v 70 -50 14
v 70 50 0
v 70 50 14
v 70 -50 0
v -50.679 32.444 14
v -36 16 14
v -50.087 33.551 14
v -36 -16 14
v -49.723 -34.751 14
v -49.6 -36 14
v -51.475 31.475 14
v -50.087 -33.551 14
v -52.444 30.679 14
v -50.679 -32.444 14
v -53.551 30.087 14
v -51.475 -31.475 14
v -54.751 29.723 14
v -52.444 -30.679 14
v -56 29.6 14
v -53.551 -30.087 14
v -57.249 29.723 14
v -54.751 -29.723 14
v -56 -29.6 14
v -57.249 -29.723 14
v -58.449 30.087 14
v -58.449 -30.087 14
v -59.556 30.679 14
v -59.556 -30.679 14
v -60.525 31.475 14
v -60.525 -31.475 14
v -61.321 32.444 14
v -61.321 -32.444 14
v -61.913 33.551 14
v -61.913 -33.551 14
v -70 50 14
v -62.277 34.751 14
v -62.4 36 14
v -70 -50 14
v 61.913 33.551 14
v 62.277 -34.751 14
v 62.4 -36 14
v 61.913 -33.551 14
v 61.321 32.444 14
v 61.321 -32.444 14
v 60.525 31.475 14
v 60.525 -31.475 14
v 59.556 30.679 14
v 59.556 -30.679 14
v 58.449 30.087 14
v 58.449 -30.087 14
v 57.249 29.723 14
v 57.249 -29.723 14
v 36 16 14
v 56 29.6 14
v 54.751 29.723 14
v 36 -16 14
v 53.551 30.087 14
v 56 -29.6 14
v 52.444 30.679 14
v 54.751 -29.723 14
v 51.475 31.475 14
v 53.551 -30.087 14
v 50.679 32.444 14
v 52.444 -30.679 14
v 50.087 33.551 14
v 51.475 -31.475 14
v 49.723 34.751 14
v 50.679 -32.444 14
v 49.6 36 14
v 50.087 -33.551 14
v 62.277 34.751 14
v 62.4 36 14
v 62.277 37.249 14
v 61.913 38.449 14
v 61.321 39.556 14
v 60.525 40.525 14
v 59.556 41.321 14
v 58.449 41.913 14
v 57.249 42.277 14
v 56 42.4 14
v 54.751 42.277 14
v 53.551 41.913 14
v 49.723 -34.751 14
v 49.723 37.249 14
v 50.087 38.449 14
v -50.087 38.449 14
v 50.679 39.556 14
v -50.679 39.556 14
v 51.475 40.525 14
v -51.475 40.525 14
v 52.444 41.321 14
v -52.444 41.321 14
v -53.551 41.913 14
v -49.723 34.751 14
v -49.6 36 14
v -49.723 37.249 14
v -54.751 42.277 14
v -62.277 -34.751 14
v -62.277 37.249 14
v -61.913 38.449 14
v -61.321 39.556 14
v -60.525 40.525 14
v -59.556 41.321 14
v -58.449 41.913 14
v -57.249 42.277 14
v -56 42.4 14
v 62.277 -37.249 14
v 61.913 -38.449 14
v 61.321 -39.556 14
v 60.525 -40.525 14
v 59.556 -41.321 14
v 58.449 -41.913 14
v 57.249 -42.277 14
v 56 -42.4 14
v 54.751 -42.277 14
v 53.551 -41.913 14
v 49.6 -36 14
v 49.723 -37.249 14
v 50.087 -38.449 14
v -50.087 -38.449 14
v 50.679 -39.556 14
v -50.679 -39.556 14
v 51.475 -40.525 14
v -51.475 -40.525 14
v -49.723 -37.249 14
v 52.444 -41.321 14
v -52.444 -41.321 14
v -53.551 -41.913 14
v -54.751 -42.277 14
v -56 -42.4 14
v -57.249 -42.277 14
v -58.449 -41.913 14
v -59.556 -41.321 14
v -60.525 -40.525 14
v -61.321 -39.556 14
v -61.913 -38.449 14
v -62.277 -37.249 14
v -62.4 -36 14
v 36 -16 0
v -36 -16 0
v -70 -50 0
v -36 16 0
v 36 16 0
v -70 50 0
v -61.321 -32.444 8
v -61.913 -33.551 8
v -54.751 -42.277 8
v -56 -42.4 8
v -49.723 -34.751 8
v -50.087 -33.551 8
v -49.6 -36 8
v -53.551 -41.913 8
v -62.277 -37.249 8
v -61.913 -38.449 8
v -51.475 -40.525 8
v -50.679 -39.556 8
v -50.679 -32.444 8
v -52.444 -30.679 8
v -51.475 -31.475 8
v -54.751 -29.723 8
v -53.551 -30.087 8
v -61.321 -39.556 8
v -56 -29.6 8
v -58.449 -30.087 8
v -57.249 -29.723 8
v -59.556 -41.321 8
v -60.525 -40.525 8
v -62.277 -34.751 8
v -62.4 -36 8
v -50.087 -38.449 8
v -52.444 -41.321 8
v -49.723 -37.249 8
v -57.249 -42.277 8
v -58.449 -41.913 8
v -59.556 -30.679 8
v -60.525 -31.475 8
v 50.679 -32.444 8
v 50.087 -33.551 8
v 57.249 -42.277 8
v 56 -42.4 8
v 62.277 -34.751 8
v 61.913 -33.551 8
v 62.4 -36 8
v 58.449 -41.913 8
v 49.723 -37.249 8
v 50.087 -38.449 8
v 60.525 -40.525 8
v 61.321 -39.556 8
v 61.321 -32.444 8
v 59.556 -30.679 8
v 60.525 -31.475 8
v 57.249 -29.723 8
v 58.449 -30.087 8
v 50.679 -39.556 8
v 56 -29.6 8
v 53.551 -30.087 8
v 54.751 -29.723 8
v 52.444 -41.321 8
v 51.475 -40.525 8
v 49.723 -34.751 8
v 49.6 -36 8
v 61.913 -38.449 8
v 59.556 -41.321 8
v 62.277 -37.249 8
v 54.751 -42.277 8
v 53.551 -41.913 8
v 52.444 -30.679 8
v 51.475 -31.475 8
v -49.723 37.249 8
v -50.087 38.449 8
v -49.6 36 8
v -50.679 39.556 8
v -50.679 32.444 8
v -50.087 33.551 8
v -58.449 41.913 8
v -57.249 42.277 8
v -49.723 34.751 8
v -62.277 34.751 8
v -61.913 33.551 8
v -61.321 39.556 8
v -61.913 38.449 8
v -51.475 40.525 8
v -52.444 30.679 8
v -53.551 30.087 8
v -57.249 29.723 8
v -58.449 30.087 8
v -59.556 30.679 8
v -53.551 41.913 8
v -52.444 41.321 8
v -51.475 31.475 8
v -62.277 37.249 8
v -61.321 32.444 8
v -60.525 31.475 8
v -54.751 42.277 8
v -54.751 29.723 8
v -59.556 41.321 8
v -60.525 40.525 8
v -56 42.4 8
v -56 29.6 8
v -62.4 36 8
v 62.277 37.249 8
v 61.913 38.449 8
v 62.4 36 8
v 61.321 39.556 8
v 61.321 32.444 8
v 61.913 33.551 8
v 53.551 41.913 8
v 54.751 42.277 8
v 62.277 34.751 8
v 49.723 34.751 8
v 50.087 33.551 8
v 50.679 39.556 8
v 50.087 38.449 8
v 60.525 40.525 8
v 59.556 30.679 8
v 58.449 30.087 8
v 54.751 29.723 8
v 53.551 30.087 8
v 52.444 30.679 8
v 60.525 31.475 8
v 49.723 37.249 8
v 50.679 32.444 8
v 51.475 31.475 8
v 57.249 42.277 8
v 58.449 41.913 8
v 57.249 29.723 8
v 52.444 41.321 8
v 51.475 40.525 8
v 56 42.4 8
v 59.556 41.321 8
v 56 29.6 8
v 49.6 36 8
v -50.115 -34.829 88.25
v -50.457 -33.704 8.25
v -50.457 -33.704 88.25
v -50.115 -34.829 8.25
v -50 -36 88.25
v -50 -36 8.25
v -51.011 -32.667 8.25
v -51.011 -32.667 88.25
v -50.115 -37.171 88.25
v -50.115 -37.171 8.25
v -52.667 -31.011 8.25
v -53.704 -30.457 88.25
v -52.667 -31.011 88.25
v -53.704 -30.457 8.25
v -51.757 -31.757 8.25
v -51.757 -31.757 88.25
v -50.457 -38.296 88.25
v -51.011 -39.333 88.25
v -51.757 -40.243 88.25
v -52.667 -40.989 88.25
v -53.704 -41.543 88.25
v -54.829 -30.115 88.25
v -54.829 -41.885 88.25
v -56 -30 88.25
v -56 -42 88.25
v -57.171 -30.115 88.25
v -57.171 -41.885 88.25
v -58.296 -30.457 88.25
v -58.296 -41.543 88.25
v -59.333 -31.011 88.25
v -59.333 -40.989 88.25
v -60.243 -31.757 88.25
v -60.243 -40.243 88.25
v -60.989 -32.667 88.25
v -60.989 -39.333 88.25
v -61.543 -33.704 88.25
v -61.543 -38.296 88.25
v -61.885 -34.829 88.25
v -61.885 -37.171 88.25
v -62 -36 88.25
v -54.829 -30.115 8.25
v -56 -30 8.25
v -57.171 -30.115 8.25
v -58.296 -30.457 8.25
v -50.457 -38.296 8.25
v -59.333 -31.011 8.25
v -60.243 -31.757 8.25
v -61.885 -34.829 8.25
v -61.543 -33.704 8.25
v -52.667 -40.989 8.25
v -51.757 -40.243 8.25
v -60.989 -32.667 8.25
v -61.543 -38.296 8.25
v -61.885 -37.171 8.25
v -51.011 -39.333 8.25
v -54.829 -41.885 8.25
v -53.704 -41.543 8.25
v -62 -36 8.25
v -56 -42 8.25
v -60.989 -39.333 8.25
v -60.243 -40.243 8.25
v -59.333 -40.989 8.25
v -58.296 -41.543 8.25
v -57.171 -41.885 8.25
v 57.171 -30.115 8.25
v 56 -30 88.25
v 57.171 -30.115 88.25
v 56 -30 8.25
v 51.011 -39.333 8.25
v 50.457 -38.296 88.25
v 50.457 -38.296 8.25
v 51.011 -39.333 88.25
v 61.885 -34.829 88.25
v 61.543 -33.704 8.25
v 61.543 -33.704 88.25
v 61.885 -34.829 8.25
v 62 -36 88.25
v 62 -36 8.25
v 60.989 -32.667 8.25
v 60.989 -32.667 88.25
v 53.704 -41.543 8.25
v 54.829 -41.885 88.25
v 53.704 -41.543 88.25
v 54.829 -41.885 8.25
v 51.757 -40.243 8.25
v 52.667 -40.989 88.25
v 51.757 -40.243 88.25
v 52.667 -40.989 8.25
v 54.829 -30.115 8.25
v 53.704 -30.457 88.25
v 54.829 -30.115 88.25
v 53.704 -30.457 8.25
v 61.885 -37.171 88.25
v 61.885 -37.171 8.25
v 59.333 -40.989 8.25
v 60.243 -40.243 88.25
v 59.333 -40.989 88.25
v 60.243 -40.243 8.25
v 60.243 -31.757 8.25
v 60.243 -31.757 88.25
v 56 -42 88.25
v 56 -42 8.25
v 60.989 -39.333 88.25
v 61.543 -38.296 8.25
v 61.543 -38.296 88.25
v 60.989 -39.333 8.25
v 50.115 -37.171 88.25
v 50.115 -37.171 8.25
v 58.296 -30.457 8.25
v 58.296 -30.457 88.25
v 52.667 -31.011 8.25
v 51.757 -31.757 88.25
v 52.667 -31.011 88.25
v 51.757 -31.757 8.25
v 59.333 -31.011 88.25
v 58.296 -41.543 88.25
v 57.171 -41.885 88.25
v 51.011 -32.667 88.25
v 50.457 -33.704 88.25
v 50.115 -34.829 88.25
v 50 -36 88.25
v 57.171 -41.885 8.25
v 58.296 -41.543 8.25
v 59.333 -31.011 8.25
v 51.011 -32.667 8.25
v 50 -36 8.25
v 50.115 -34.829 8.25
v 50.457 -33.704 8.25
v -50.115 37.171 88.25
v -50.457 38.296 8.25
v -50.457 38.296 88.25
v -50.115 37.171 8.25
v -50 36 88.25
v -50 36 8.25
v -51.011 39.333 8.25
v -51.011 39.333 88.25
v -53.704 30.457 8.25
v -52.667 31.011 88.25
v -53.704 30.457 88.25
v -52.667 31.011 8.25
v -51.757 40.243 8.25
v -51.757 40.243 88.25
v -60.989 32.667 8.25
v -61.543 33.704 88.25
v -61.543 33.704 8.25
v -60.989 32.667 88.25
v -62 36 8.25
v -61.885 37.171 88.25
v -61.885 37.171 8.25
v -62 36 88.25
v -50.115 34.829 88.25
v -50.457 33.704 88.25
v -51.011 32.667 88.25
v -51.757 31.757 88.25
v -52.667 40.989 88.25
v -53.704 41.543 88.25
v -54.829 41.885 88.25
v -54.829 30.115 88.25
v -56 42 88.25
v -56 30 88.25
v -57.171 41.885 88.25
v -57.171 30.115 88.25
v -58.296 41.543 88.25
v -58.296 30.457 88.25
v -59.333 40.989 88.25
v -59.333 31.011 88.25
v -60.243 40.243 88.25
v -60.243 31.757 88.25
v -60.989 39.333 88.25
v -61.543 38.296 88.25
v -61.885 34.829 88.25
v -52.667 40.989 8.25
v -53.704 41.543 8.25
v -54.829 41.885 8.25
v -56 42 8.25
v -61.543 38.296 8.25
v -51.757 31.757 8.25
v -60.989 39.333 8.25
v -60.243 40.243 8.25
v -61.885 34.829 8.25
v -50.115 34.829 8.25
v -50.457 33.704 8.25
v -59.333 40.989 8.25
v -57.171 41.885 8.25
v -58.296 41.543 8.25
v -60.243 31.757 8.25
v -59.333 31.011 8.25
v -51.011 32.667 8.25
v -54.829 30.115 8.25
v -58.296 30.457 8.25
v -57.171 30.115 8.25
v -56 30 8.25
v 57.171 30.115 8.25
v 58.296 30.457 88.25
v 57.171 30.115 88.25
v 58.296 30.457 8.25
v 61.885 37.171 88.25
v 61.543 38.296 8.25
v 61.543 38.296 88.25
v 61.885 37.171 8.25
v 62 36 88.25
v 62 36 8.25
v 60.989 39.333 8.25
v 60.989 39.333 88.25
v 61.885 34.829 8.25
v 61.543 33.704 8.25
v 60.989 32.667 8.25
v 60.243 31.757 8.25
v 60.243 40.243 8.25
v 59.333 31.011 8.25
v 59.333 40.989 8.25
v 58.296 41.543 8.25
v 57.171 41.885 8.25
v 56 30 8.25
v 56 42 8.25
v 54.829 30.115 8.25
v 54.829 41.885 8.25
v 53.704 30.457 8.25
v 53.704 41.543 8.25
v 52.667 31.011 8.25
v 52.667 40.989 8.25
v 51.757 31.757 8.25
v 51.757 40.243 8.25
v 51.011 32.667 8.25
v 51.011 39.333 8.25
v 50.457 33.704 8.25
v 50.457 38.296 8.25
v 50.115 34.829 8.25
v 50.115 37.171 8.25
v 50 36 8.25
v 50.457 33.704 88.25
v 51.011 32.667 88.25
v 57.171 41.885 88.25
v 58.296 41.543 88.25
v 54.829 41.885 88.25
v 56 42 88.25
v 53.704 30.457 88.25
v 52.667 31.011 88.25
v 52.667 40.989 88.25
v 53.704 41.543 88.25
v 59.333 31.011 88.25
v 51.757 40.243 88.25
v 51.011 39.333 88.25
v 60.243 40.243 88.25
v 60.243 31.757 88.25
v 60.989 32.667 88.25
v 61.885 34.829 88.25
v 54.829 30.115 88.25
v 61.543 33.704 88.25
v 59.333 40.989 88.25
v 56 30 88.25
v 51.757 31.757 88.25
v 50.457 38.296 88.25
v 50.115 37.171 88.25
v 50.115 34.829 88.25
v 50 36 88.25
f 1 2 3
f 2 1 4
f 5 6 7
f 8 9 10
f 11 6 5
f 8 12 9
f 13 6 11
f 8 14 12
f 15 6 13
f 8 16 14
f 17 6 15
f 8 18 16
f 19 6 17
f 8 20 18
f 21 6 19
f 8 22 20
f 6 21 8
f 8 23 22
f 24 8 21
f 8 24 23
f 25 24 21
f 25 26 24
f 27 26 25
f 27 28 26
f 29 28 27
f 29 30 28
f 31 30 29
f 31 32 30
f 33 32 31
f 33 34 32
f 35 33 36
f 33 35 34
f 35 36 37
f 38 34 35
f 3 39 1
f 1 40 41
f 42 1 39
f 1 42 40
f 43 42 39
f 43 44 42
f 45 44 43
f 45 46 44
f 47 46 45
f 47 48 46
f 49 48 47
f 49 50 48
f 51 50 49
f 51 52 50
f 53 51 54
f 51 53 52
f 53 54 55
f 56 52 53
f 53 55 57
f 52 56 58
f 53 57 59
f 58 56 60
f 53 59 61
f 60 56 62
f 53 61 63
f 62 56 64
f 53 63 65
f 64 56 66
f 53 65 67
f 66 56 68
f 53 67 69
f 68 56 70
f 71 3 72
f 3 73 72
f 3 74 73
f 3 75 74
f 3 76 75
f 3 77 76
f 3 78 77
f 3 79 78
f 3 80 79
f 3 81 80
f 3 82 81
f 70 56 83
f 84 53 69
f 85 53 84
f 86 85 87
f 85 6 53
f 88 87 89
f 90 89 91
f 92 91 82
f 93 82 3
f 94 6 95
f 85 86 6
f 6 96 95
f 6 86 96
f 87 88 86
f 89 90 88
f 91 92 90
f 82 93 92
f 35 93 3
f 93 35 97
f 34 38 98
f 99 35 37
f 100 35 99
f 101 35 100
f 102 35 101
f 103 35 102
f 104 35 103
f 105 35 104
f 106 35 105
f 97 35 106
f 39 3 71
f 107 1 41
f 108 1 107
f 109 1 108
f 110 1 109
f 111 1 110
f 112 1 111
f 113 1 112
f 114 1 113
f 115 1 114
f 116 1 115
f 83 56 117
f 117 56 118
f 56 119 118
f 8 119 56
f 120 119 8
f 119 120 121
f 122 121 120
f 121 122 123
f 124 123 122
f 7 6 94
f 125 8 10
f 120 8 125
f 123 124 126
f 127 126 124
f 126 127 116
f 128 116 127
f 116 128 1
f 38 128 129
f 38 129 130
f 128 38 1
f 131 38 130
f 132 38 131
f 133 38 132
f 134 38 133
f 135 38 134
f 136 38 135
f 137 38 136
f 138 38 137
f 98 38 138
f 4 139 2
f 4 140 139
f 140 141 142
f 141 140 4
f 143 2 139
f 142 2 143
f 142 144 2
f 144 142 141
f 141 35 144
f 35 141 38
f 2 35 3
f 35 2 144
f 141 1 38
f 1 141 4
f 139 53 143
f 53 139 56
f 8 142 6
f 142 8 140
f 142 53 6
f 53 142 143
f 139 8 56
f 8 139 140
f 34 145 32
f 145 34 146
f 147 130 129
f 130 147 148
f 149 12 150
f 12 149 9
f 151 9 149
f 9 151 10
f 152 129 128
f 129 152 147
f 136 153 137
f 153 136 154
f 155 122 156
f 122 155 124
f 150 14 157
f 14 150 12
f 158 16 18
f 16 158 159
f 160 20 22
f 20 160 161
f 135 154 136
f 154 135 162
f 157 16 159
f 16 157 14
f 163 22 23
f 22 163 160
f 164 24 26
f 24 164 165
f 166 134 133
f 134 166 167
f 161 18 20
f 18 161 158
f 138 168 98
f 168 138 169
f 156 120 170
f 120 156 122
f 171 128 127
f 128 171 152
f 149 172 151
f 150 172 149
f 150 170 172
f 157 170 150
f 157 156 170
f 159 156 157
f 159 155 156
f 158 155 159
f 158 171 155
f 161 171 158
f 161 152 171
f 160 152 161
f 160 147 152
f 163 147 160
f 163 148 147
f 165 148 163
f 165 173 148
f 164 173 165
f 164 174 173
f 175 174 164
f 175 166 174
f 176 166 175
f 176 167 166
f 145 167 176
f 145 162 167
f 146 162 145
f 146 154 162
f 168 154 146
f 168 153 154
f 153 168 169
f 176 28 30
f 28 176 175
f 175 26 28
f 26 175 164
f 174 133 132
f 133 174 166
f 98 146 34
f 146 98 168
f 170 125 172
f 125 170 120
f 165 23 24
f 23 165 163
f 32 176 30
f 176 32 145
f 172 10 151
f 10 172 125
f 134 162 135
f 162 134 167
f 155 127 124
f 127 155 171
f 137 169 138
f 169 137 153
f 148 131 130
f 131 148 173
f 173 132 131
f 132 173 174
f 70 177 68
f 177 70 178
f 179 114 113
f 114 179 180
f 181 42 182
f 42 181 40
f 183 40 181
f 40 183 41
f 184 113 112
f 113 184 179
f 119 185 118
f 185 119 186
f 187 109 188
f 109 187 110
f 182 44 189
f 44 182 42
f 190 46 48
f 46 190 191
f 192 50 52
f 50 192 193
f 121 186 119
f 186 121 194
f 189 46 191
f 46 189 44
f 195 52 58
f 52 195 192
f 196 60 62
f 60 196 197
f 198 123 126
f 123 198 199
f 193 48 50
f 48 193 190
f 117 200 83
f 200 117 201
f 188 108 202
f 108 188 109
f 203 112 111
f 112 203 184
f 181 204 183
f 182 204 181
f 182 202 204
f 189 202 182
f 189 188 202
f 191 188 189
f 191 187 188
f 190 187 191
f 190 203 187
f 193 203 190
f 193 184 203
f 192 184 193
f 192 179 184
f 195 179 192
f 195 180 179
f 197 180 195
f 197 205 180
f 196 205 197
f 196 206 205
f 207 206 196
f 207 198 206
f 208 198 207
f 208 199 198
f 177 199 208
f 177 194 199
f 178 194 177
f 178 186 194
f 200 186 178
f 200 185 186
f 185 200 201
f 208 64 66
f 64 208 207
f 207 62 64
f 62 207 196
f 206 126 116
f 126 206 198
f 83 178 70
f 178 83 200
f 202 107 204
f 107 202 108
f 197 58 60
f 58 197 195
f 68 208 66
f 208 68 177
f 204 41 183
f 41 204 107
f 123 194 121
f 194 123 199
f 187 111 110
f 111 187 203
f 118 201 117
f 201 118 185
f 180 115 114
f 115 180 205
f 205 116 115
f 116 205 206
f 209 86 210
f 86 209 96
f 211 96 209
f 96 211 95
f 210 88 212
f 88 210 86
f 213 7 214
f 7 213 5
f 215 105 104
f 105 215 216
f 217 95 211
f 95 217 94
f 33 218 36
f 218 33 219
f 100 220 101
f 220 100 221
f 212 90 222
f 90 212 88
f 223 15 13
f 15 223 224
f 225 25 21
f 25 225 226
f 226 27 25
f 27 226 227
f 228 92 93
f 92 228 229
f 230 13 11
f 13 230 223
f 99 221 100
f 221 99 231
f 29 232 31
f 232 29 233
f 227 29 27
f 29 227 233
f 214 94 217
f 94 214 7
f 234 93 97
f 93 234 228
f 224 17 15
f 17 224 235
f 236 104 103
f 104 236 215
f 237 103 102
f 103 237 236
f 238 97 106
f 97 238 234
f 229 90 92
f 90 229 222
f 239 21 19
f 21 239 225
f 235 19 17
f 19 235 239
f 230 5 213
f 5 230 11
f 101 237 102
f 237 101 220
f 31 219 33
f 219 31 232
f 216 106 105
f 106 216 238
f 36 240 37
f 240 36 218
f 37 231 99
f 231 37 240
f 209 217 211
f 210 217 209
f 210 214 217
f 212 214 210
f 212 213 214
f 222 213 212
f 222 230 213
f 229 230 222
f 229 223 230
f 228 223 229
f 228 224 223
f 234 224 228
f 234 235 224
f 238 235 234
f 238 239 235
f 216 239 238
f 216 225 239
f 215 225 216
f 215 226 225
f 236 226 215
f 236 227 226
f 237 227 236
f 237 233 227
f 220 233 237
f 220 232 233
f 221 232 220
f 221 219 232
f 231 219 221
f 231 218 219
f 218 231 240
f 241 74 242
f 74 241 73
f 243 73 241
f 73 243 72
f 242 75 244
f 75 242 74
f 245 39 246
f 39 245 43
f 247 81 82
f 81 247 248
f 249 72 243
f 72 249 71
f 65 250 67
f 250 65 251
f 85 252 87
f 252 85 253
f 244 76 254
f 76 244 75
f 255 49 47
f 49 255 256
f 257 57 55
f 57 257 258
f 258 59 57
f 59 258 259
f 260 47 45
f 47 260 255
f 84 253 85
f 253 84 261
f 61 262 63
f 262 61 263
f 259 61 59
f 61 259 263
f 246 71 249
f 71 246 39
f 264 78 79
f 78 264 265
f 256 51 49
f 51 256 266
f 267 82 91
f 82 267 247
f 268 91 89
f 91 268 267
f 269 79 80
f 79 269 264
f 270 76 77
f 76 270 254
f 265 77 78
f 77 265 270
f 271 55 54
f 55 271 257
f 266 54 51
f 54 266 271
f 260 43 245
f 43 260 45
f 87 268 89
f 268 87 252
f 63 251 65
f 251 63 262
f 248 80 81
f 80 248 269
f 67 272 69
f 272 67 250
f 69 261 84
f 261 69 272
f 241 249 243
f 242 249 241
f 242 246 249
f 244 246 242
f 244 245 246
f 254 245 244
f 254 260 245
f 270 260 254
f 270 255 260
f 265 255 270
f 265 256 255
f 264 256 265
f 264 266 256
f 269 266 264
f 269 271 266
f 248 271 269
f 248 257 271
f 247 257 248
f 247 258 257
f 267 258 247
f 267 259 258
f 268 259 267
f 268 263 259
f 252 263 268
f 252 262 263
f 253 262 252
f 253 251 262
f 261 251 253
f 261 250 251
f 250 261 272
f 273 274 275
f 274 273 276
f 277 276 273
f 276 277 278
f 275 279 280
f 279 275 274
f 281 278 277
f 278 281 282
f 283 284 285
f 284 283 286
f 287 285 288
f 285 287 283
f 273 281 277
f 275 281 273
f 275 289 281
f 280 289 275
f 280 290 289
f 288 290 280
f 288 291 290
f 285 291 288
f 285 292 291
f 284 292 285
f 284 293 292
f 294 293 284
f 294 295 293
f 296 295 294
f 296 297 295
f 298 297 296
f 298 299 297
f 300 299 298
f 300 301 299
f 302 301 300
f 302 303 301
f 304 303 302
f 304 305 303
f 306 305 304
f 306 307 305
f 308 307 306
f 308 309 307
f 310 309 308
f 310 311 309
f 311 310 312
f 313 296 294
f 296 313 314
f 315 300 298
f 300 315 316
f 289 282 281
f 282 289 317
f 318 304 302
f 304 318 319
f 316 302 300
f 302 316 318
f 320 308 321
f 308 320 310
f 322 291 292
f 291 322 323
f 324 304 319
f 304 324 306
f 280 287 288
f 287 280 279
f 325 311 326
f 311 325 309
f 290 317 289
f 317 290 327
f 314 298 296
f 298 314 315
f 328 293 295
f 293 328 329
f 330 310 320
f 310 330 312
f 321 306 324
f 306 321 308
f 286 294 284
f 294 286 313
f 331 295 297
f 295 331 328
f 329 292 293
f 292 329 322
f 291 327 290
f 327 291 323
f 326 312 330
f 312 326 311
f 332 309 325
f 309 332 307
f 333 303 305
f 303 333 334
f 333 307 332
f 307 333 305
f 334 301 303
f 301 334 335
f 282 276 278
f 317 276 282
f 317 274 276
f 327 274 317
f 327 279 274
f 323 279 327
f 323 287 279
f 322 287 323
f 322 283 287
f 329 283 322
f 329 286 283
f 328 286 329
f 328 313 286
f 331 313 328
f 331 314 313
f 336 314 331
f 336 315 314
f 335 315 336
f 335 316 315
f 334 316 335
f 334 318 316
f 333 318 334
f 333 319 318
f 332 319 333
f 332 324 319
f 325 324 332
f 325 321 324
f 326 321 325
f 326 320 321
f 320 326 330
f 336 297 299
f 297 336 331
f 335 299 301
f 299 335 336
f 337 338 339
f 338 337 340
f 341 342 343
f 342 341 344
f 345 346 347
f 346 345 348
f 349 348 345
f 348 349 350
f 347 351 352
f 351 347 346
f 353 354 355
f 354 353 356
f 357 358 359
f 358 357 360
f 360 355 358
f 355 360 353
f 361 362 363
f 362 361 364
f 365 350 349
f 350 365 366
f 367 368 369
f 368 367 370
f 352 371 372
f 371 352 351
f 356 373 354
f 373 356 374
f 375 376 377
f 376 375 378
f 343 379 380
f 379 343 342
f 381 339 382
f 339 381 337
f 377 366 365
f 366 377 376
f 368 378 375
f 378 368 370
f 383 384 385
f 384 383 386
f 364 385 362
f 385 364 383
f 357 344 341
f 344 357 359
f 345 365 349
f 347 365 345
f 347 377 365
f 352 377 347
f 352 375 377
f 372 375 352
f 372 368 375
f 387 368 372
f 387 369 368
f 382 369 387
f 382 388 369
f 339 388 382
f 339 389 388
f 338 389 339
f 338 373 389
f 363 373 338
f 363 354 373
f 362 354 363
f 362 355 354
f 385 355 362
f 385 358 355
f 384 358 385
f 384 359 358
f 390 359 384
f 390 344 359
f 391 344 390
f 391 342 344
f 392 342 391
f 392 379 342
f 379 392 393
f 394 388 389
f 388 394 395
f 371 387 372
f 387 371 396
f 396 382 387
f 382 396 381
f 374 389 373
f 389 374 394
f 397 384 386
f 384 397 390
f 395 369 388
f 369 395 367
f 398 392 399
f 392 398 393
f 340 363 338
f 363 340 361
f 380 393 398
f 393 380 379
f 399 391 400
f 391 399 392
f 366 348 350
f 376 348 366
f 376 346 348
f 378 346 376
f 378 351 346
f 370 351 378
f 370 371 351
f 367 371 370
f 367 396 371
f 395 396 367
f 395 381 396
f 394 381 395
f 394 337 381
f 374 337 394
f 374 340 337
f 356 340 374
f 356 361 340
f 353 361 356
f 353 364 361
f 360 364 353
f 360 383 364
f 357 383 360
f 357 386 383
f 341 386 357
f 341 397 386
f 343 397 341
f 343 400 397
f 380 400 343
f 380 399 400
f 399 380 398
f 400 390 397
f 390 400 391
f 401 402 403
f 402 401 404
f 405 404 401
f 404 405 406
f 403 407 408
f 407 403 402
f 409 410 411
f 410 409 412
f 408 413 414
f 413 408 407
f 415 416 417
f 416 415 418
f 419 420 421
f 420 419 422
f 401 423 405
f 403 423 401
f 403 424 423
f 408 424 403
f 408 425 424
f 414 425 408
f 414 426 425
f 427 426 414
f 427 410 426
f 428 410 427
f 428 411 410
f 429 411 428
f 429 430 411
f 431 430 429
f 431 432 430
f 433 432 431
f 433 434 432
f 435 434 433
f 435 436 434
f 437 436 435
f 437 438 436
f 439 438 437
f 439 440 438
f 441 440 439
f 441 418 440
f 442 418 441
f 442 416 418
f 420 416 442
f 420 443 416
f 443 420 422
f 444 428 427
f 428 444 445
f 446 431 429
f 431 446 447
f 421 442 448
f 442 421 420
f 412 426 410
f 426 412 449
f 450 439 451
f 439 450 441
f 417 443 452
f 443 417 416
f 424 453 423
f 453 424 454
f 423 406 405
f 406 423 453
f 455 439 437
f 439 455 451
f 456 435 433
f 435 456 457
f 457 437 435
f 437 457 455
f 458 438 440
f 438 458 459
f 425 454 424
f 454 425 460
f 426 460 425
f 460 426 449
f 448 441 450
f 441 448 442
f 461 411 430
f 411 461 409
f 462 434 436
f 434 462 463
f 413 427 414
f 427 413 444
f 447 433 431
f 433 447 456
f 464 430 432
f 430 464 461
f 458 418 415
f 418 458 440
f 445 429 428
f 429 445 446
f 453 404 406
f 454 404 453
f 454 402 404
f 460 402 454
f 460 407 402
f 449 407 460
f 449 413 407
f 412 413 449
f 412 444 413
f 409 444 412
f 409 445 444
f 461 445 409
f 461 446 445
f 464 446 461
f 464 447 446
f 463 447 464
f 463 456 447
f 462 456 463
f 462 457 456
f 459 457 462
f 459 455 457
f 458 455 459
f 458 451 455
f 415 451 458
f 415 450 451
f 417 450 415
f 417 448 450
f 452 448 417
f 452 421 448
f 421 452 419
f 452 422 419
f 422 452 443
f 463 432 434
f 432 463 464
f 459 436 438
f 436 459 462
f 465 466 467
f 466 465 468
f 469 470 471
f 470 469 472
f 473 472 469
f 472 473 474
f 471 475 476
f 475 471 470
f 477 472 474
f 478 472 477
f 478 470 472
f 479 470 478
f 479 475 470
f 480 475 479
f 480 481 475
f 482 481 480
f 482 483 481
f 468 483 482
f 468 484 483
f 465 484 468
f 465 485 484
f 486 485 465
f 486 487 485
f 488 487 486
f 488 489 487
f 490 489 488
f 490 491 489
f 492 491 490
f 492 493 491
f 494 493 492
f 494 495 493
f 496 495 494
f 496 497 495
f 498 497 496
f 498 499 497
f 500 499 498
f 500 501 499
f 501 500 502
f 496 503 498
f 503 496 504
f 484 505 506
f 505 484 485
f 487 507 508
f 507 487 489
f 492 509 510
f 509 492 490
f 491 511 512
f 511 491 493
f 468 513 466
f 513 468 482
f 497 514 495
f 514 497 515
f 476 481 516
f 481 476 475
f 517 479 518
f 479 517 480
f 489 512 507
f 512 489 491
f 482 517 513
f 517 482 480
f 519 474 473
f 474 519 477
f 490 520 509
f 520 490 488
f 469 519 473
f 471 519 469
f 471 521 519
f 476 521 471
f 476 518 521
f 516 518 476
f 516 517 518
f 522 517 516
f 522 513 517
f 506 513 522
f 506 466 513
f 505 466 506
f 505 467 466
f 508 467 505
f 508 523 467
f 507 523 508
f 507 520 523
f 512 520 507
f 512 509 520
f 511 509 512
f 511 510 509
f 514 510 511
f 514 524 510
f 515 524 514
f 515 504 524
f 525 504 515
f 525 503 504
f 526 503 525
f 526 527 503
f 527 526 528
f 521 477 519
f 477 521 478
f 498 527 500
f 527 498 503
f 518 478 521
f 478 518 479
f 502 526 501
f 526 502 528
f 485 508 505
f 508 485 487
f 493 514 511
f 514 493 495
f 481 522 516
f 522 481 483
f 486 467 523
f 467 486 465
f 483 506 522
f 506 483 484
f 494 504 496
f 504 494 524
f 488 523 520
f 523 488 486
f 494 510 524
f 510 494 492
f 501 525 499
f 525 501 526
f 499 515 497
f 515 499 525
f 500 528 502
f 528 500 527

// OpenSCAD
$fn = 32;

// ------------------------------------------------------------------------
// Frame with four posts: 140 x 100 mm frame, four d12 posts
// Every part is its own module, assembly() places them once.
// ------------------------------------------------------------------------

// --- part 1 ---
module base_frame() {
  difference() {
    translate([-70, -50, 0]) cube([140, 100, 14]);
    translate([-36, -16, -1]) cube([72, 32, 16]);
    translate([-56, -36, 8]) cylinder(h = 7, d = 12.8);
    translate([56, -36, 8]) cylinder(h = 7, d = 12.8);
    translate([-56, 36, 8]) cylinder(h = 7, d = 12.8);
    translate([56, 36, 8]) cylinder(h = 7, d = 12.8);
  }
}

// --- part 2 ---
module post1() {
  cylinder(h = 80, d = 12);
}

// --- part 3 ---
module post2() {
  cylinder(h = 80, d = 12);
}

// --- part 4 ---
module post3() {
  cylinder(h = 80, d = 12);
}

// --- part 5 ---
module post4() {
  cylinder(h = 80, d = 12);
}

// --- assembly ---
module assembly() {
  translate([0, 0, 0]) rotate([0, 0, 0]) base_frame();
  translate([-56, -36, 8.25]) rotate([0, 0, 0]) post1();
  translate([56, -36, 8.25]) rotate([0, 0, 0]) post2();
  translate([-56, 36, 8.25]) rotate([0, 0, 0]) post3();
  translate([56, 36, 8.25]) rotate([0, 0, 0]) post4();
}

assembly();
